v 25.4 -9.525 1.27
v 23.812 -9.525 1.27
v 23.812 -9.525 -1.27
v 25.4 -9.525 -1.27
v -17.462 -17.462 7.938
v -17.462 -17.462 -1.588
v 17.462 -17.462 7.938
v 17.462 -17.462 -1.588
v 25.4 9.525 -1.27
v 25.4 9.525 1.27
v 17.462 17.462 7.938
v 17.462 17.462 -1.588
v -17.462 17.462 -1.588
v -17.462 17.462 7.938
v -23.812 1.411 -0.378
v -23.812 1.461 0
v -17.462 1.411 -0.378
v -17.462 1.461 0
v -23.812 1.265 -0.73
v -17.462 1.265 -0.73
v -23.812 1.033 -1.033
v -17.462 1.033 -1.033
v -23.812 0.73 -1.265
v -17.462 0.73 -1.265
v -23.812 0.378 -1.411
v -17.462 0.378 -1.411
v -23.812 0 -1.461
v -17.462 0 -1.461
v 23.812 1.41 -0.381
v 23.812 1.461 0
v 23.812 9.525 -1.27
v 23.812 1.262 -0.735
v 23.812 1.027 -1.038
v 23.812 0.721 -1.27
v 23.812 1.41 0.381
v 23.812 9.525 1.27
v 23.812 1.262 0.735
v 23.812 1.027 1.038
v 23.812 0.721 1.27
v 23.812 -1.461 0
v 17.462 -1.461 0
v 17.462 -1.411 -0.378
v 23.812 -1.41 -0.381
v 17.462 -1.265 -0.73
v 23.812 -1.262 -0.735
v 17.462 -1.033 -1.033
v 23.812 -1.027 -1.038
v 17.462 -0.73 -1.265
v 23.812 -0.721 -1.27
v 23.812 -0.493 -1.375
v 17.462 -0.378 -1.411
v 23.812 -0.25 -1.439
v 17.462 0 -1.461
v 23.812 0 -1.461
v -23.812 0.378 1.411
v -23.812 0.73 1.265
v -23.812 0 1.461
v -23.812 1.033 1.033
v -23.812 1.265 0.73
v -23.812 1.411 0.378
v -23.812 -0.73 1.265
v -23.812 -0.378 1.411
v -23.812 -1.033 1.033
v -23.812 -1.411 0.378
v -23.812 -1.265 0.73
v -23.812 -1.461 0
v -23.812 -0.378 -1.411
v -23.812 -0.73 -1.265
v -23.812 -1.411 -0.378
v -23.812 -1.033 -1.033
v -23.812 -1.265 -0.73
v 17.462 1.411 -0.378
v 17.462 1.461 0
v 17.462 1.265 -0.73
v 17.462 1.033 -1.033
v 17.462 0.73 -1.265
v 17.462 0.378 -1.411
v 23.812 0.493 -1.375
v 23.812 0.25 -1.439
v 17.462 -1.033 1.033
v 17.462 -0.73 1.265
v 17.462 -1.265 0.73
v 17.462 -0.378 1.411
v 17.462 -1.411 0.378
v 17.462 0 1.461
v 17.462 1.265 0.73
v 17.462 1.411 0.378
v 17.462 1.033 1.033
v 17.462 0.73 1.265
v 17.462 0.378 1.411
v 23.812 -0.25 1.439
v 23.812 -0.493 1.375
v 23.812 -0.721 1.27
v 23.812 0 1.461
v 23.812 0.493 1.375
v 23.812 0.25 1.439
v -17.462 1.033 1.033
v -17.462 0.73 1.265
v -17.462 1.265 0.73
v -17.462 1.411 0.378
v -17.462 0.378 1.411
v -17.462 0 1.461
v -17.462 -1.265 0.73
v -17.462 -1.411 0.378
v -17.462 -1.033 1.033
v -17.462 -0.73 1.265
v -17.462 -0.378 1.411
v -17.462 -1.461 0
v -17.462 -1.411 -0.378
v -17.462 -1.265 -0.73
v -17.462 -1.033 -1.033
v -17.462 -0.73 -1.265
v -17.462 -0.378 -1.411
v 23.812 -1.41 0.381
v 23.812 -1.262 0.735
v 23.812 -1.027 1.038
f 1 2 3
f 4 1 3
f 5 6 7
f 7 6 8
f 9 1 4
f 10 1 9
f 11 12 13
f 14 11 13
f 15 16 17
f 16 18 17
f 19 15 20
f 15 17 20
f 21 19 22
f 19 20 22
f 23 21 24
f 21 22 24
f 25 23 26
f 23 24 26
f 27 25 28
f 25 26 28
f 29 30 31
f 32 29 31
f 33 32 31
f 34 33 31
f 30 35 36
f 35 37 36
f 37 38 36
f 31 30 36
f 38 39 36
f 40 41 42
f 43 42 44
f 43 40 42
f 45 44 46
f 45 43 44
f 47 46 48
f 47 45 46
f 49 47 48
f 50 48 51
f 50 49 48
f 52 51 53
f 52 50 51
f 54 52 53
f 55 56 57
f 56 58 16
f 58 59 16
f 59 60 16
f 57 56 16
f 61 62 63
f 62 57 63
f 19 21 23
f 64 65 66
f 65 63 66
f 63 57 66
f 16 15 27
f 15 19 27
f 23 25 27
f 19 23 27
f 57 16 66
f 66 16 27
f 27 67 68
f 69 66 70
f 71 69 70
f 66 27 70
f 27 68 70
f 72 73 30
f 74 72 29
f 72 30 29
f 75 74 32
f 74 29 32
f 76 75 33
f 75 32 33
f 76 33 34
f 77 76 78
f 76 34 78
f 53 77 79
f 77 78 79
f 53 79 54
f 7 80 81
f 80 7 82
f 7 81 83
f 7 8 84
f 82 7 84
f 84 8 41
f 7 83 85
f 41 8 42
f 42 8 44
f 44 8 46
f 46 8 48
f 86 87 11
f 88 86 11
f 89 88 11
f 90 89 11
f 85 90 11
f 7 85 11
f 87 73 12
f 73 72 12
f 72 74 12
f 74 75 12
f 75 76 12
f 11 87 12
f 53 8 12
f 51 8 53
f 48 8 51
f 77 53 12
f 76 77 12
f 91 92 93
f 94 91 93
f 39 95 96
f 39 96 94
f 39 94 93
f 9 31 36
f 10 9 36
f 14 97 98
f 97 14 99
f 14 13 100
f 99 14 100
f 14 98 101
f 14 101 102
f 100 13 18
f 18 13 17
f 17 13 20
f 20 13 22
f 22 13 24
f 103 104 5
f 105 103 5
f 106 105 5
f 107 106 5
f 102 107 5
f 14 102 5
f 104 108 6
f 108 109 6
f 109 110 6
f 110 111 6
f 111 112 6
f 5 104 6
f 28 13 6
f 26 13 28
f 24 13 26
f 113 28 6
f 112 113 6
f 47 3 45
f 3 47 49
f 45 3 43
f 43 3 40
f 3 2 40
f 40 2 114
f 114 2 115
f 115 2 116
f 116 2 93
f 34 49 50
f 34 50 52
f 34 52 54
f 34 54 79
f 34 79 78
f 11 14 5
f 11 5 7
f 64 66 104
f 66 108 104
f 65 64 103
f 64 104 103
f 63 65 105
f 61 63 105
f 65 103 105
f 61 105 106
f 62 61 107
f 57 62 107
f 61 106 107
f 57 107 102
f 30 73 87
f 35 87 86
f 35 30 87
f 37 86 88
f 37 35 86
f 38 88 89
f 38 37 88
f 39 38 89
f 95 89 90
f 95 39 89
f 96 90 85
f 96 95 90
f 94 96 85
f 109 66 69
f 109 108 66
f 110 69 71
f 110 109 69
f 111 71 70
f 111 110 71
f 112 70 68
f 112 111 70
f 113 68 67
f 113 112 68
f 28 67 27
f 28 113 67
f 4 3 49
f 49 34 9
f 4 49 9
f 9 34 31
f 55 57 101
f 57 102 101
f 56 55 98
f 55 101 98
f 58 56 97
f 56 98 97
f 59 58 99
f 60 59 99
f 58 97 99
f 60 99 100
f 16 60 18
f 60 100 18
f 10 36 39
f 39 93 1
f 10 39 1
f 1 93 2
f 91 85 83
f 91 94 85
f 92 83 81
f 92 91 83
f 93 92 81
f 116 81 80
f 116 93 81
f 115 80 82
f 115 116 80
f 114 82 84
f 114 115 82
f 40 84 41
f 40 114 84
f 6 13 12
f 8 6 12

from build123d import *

# Parameters (mm, degrees)
F0_W     = 31.75
F0_H     = 31.75
F1_DEPTH = 1.5875
F0_W_2   = 6.35
F0_H_2   = 1.4605
F2_DEPTH = 1.4605
F3_R     = 1.46049
F5_DEPTH = 1.5875
F6_DEPTH = 6.35


# Not quite as in the source:
# - a fillet or chamfer is up to 0.001 mm smaller than in the source, because OpenCascade refuses the exact size
# - ends of sketch curves that miss each other by under 0.0002 mm in the source are joined


with BuildPart() as f1:
    # F0 (on Top) → F1 (new body, symmetric)
    with BuildSketch(Plane.XY):
        Polygon((17.4625, 17.4625), (-17.4625, 17.4625), (-17.4625, 1.4605), (-17.4625, 0), (-17.4625, -1.4605), (-17.4625, -17.4625), (17.4625, -17.4625), (17.4625, -1.4605), (17.4625, 0), (17.4625, 1.4605), align=None)
        Rectangle(F0_W, F0_H, mode=Mode.SUBTRACT)
        Rectangle(F0_W, F0_H)
    extrude(amount=F1_DEPTH, both=True)

    # F0 (on Top) → F2 (join, symmetric)
    with BuildSketch(Plane.XY):
        with Locations((-20.6375, 0.73025)):
            Rectangle(F0_W_2, F0_H_2)
        with Locations((-20.6375, -0.73025)):
            Rectangle(F0_W_2, F0_H_2)
        with Locations((20.6375, 0.73025)):
            Rectangle(F0_W_2, F0_H_2)
        with Locations((20.6375, -0.73025)):
            Rectangle(F0_W_2, F0_H_2)
    extrude(amount=F2_DEPTH, both=True)

    # F3 (radius 1.4605 in the source; OpenCascade refuses exactly that, so slightly less here)
    f3_edges = [f1.edges().sort_by_distance(p)[0] for p in [
        (-20.6375, -1.4605, 1.4605),
        (-20.6375, 1.4605, 1.4605),
        (-20.6375, -1.4605, -1.4605),
        (-20.6375, 1.4605, -1.4605),
        (20.6375, 1.4605, -1.4605),
        (20.6375, -1.4605, -1.4605),
        (20.6375, -1.4605, 1.4605),
        (20.6375, 1.4605, 1.4605),
    ]]
    fillet(f3_edges, radius=F3_R)

    # F4 (on face) → F5 (join)
    with BuildSketch(Plane.YZ.offset(23.8125)):
        with BuildLine():
            Line((9.525, 1.27), (0.7212287186, 1.27))
            ThreePointArc((0.7212287186, 1.27), (1.2622230895, 0.7347542799), (1.4605, 1e-05))
            ThreePointArc((1.4605, 1e-05), (1.2622230895, -0.7347542799), (0.7212287186, -1.27))
            Line((0.7212287186, -1.27), (9.525, -1.27))
            Line((9.525, -1.27), (9.525, 1.27))
        make_face()
        with BuildLine():
            Line((-0.7212287186, 1.27), (-9.525, 1.27))
            Line((-9.525, 1.27), (-9.525, -1.27))
            Line((-9.525, -1.27), (-0.7212287186, -1.27))
            ThreePointArc((-0.7212287186, -1.27), (-1.2622230895, -0.7347542799), (-1.4605, -1e-05))
            ThreePointArc((-1.4605, -1e-05), (-1.2622230895, 0.7347542799), (-0.7212287186, 1.27))
        make_face()
        with BuildLine():
            Line((0.7212287186, 1.27), (-0.7212287186, 1.27))
            ThreePointArc((-0.7212287186, 1.27), (-1.2622230895, 0.7347542799), (-1.4605, 1e-05))
            ThreePointArc((-1.4605, 1e-05), (-1.2622230895, -0.7347542799), (-0.7212287186, -1.27))
            Line((-0.7212287186, -1.27), (0.7212287186, -1.27))
            ThreePointArc((0.7212287186, -1.27), (1.2622230895, -0.7347542799), (1.4605, -1e-05))
            ThreePointArc((1.4605, -1e-05), (1.2622230895, 0.7347542799), (0.7212287186, 1.27))
        make_face()
    extrude(amount=F5_DEPTH)

    # F6 (add): a face of the model
    f6_faces = [f1.faces().sort_by_distance(p)[0] for p in [
        (0, 0, 1.5875),
    ]]
    extrude(f6_faces, amount=F6_DEPTH)


solid = f1.part
